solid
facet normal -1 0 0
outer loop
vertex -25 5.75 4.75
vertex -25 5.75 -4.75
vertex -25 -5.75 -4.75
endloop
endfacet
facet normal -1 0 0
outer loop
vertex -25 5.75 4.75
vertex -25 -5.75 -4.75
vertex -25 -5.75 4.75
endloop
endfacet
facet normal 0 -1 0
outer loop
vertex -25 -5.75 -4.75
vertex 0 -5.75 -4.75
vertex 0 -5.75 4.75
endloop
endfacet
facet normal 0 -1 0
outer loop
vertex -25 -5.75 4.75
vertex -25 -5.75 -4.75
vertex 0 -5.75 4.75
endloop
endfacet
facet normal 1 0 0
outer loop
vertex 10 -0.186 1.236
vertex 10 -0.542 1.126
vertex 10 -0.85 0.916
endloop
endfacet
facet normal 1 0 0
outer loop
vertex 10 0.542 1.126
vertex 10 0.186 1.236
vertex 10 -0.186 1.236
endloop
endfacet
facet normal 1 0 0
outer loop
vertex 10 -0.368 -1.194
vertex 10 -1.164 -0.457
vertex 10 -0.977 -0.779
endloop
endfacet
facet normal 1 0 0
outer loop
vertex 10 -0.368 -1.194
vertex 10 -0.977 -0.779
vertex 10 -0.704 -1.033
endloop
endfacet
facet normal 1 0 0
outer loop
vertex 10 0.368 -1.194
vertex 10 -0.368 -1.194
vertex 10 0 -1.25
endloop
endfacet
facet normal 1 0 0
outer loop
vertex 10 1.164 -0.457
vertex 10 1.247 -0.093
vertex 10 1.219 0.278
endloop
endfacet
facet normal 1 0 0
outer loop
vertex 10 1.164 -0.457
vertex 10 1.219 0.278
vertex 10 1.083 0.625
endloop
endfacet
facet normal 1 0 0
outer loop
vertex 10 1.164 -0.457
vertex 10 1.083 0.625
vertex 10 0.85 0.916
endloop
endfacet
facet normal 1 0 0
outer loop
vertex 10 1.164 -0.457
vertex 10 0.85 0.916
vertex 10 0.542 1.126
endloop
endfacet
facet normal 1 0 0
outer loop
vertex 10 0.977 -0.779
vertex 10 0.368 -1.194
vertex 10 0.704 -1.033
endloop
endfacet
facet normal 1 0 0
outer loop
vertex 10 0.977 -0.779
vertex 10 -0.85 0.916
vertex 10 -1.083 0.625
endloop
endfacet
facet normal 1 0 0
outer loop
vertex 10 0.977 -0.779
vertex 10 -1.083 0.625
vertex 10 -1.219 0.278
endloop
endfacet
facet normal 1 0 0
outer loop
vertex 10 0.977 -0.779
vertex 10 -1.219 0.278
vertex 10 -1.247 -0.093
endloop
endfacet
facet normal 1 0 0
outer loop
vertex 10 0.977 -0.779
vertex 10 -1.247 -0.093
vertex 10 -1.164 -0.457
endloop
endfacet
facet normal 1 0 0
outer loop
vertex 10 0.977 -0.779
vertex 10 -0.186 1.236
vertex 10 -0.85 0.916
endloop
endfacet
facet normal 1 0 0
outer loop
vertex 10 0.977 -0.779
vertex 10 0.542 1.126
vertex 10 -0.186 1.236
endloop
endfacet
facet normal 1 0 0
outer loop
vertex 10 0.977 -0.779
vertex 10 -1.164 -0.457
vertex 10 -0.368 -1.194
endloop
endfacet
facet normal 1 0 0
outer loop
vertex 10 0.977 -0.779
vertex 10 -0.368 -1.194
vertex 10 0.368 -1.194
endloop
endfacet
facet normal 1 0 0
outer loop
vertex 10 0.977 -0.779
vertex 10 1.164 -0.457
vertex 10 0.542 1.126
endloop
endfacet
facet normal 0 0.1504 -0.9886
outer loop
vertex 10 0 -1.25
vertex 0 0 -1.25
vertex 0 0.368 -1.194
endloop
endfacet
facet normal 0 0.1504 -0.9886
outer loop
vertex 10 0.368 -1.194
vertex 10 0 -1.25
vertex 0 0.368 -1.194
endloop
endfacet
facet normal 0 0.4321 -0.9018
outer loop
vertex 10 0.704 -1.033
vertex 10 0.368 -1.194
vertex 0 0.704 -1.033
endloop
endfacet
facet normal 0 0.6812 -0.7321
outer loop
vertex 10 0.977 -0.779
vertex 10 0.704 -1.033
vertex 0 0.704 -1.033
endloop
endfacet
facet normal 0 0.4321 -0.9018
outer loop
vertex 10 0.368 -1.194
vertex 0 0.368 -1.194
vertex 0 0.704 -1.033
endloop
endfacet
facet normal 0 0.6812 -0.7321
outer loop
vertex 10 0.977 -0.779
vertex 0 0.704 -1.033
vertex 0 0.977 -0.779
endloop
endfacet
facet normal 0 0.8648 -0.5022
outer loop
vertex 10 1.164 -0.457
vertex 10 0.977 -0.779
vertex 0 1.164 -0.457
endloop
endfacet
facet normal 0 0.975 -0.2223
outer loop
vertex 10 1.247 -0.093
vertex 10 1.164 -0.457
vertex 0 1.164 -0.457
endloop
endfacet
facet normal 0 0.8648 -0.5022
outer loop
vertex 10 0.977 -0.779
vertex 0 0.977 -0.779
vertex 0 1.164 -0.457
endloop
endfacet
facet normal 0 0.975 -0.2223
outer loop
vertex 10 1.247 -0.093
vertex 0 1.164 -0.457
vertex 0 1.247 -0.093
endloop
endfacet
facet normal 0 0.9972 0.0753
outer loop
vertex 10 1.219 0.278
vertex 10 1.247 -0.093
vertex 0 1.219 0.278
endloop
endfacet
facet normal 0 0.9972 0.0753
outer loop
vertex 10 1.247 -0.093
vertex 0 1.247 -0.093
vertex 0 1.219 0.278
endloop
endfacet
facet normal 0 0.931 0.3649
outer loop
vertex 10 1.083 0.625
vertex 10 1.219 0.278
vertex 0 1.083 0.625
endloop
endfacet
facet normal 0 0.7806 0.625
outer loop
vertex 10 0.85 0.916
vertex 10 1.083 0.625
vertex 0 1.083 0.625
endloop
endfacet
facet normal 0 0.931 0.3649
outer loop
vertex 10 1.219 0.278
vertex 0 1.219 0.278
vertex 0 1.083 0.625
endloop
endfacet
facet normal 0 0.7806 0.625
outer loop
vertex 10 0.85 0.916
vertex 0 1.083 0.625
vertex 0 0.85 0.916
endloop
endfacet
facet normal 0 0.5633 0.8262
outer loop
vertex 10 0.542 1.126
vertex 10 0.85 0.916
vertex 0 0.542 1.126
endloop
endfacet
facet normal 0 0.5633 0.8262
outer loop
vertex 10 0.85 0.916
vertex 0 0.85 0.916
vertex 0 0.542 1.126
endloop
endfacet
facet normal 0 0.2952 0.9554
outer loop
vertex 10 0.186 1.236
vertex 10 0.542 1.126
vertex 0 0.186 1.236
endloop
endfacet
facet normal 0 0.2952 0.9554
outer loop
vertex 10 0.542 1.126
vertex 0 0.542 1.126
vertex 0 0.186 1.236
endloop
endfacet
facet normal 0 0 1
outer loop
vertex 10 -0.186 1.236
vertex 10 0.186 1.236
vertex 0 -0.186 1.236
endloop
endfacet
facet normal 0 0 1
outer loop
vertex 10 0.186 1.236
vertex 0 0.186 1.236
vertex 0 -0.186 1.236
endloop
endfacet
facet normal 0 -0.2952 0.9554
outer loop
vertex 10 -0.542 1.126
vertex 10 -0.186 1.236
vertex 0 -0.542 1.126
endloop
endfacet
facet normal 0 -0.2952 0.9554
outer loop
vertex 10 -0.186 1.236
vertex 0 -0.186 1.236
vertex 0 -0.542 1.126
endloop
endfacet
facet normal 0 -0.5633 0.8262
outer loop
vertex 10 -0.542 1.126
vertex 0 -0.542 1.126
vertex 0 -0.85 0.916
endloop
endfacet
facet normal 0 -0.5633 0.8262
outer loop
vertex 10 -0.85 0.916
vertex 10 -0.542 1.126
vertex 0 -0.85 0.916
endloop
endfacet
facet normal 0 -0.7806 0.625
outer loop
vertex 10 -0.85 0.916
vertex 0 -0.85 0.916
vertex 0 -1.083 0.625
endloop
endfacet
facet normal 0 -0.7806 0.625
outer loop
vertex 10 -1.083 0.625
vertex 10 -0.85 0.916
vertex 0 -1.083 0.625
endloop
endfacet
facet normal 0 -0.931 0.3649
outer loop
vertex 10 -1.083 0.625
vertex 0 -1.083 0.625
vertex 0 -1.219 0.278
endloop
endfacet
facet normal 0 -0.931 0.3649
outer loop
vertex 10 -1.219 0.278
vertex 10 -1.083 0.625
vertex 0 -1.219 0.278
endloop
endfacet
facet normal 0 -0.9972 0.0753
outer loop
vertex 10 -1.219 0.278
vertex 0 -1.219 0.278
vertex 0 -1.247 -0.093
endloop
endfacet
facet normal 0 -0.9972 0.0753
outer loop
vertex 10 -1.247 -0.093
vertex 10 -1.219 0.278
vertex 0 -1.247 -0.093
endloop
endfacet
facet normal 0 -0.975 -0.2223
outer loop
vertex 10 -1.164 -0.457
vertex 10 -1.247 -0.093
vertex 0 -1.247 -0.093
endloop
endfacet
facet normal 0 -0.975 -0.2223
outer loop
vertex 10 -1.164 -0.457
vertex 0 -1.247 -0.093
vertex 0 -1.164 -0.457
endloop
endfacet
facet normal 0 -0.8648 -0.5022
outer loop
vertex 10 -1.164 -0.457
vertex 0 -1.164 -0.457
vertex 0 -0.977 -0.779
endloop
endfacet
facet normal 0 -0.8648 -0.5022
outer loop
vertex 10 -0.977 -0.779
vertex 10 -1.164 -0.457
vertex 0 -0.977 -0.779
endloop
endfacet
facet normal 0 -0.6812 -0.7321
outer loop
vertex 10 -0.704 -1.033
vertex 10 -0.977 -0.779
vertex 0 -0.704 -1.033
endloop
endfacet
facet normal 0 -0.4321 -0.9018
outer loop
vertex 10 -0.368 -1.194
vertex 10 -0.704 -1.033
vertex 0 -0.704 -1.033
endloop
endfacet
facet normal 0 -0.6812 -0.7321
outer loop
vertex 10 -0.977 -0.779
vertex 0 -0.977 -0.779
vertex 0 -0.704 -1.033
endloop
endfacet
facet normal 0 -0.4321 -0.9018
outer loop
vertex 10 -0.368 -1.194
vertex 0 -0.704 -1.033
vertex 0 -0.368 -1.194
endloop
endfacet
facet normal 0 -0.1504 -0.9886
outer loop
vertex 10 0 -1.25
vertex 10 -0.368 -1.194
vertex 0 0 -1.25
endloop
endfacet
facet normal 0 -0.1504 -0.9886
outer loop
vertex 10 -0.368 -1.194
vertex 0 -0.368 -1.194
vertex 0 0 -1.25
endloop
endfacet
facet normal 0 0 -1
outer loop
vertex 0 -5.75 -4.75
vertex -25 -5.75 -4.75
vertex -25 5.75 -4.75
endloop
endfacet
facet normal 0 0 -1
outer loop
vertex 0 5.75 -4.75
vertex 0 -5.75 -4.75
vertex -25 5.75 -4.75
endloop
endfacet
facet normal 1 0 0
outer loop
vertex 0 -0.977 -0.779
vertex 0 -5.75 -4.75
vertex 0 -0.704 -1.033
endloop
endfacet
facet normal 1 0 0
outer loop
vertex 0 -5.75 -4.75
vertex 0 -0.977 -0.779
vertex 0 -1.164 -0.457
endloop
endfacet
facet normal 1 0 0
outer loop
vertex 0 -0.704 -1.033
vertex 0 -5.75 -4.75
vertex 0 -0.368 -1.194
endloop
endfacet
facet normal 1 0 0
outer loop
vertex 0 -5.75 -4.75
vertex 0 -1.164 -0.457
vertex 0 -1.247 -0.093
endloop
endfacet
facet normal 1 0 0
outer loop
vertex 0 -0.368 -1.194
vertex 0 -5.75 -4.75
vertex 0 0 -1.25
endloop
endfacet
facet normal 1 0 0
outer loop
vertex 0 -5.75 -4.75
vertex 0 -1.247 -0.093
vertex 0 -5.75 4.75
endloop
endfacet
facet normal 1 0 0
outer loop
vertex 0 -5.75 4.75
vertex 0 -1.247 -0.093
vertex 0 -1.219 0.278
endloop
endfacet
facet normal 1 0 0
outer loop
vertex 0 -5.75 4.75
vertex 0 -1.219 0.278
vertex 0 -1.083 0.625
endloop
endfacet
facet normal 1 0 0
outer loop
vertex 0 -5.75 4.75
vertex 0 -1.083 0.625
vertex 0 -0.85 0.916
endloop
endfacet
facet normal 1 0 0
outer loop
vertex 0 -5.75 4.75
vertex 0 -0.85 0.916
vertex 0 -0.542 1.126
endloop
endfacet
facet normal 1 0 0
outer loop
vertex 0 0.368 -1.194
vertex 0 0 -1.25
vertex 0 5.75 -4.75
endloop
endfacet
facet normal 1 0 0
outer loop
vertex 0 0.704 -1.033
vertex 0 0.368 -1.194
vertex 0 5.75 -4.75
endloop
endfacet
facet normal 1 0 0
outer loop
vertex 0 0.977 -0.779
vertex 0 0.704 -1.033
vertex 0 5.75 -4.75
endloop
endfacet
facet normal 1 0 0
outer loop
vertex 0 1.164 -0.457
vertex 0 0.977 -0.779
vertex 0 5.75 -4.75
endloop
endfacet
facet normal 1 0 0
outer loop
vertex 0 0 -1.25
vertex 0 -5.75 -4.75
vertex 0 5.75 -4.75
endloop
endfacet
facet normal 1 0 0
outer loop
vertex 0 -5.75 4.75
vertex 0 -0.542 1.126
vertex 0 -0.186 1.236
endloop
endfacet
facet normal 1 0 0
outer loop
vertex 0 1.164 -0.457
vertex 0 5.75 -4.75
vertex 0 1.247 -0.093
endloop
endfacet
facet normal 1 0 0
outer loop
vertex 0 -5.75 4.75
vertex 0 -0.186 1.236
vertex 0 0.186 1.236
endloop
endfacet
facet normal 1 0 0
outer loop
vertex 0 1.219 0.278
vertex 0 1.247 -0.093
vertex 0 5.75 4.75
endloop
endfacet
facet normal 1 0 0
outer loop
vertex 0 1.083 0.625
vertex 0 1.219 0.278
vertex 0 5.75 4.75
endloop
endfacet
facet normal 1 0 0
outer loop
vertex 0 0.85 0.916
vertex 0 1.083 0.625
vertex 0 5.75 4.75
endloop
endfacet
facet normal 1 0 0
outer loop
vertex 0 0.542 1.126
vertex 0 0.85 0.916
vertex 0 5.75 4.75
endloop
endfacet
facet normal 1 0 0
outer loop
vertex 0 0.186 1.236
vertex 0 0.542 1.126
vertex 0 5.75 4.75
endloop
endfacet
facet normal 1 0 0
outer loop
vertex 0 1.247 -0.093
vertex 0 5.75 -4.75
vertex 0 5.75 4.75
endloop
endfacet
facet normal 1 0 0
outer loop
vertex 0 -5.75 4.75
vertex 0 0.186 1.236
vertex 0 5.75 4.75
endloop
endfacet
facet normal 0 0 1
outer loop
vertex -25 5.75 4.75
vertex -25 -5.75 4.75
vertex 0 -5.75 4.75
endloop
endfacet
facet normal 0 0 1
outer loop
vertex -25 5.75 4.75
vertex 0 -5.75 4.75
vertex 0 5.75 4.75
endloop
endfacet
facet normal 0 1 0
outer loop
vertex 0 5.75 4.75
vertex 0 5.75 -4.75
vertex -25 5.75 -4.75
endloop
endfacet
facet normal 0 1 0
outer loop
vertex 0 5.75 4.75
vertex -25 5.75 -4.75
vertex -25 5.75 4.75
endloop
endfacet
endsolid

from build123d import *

# Parameters (mm, degrees)
SKETCH1_R           = 1.25
BOSS_EXTRUDE1_DEPTH = 10
SKETCH2_W           = 9.5
SKETCH2_H           = 11.5
BOSS_EXTRUDE2_DEPTH = 25


with BuildPart() as part:
    # Sketch1 → Boss-Extrude1 (new body)
    with BuildSketch(Plane(origin=(0, 0, 0), x_dir=(0, 0, -1), z_dir=(1, 0, 0))):
        Circle(SKETCH1_R)
    extrude(amount=BOSS_EXTRUDE1_DEPTH)

    # Sketch2 → Boss-Extrude2 (add)
    with BuildSketch(Plane.ZY):
        Rectangle(SKETCH2_W, SKETCH2_H)
    extrude(amount=BOSS_EXTRUDE2_DEPTH)


solid = part.part
